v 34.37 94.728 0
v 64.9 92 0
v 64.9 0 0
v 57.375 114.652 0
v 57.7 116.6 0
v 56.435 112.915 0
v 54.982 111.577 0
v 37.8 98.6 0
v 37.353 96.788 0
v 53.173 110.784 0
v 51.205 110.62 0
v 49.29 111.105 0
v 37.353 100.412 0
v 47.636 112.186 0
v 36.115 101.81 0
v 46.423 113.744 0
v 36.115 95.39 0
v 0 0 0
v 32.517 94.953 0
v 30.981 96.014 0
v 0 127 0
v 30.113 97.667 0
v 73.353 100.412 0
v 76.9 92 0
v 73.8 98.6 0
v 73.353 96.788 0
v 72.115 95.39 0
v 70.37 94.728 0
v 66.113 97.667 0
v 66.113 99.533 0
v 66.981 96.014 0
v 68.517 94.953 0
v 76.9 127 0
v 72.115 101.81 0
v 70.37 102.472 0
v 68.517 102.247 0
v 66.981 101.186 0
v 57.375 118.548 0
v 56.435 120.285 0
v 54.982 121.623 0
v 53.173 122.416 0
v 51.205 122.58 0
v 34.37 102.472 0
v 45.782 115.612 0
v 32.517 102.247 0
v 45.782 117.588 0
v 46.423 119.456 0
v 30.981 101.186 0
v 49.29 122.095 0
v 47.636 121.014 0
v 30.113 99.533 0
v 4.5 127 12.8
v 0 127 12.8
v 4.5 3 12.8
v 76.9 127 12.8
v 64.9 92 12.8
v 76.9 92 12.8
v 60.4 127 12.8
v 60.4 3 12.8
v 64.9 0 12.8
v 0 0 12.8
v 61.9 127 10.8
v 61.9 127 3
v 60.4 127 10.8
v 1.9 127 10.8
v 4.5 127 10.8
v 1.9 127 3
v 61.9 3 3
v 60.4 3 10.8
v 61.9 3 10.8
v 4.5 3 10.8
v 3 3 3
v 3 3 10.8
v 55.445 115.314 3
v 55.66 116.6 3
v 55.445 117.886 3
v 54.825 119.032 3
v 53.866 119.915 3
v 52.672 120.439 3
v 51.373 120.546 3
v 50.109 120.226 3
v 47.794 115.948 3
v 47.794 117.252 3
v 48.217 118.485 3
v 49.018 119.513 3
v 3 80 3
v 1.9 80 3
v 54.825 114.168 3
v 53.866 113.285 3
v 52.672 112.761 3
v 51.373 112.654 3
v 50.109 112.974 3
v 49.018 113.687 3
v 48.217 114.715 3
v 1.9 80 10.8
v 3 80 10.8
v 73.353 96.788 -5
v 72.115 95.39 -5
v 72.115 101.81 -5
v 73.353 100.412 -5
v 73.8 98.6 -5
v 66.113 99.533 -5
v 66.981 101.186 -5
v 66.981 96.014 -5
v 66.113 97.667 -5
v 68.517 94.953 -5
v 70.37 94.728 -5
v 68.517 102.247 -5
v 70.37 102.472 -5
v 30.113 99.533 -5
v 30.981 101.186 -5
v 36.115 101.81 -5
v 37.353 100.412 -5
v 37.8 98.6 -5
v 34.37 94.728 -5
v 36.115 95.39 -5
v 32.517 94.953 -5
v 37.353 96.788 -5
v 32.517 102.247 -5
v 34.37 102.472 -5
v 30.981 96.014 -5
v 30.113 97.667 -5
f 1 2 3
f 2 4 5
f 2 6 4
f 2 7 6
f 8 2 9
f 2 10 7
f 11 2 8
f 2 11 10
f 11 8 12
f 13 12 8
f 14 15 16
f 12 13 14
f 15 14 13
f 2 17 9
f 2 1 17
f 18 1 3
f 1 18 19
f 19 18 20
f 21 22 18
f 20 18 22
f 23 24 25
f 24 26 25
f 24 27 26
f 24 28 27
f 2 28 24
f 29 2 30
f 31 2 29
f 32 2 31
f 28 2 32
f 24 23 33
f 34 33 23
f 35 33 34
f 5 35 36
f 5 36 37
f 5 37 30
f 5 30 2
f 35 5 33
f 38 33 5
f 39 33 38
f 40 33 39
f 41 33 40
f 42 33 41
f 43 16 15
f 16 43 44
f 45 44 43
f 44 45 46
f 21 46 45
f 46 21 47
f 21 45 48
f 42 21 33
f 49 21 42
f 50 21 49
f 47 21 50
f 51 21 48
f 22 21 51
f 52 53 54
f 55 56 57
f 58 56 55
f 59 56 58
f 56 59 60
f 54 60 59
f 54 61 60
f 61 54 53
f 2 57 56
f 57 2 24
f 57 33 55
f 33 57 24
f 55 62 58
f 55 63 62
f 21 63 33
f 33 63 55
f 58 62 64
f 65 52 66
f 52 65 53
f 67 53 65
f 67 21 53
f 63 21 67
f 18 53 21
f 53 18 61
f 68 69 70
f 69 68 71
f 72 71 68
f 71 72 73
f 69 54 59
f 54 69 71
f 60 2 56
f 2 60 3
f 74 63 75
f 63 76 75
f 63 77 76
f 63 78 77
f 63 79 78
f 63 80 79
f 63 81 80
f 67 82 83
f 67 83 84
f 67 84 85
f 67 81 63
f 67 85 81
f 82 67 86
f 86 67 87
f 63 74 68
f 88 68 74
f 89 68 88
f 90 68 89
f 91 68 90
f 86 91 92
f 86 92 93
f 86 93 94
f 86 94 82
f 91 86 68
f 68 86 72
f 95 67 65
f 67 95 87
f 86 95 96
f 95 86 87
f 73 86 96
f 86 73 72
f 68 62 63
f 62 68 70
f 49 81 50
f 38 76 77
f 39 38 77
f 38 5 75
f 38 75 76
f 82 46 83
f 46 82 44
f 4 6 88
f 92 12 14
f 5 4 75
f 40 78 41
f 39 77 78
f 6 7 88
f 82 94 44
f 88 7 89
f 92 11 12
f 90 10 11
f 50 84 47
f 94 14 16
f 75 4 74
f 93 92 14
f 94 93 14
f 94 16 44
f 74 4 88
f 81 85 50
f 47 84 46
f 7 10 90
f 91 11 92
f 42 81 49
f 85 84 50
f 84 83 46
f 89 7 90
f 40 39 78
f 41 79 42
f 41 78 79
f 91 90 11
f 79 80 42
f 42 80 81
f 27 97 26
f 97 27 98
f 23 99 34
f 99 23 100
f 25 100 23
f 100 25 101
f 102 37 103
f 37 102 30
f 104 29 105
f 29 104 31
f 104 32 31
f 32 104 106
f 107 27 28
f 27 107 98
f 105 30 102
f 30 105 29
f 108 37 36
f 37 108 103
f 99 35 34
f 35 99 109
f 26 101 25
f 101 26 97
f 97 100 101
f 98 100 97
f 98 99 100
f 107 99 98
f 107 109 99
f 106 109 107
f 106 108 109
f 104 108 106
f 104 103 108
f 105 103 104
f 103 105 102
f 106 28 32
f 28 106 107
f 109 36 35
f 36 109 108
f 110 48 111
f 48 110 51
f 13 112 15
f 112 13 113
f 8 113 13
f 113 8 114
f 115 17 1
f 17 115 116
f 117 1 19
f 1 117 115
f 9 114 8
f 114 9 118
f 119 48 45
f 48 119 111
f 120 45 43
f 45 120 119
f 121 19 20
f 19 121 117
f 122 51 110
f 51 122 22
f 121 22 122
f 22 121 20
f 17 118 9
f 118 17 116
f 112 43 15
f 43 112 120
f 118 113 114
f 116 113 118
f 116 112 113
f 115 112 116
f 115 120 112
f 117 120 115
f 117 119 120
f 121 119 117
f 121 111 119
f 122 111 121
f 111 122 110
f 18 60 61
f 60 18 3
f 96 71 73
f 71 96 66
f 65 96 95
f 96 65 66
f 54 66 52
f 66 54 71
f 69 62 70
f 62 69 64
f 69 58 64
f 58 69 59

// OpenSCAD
difference(){

    difference(){
        translate([0, 3, 0])
        linear_extrude(height = 12.8)
        polygon( points=[[0,0],[64.9,0],[64.9,89],[76.9,89],[76.9,124],[0,124]] );
            
        translate([0, 3, 3])
        linear_extrude(height = 9.8)
        polygon( points=[[3,0],[61.9,0],[61.9,124],[1.9,124],[1.9,77],[3,77]] );
    }
    translate([51.7,116.6,0])
    linear_extrude(height = 3, scale = 0.66)
    circle(6);
}

    
translate([69.9,98.6,-5])
cylinder(d=7.8, h=5);

    
translate([33.9,98.6,-5])
cylinder(d=7.8, h=5);
            

translate([0, 0, 0])
linear_extrude(height = 12.8)
polygon( points=[[0,0],[64.9,0],[64.9,3],[0,3]] );


translate([0, 3, 10.8])
linear_extrude(height = 2)
polygon( points=[[3,0],[4.5,0],[4.5,124],[1.9,124],[1.9,77],[3,77]] );


translate([0, 3, 10.8])
linear_extrude(height = 2)
polygon( points=[[60.4,0],[61.9,0],[61.9,124],[60.4,124]] );
